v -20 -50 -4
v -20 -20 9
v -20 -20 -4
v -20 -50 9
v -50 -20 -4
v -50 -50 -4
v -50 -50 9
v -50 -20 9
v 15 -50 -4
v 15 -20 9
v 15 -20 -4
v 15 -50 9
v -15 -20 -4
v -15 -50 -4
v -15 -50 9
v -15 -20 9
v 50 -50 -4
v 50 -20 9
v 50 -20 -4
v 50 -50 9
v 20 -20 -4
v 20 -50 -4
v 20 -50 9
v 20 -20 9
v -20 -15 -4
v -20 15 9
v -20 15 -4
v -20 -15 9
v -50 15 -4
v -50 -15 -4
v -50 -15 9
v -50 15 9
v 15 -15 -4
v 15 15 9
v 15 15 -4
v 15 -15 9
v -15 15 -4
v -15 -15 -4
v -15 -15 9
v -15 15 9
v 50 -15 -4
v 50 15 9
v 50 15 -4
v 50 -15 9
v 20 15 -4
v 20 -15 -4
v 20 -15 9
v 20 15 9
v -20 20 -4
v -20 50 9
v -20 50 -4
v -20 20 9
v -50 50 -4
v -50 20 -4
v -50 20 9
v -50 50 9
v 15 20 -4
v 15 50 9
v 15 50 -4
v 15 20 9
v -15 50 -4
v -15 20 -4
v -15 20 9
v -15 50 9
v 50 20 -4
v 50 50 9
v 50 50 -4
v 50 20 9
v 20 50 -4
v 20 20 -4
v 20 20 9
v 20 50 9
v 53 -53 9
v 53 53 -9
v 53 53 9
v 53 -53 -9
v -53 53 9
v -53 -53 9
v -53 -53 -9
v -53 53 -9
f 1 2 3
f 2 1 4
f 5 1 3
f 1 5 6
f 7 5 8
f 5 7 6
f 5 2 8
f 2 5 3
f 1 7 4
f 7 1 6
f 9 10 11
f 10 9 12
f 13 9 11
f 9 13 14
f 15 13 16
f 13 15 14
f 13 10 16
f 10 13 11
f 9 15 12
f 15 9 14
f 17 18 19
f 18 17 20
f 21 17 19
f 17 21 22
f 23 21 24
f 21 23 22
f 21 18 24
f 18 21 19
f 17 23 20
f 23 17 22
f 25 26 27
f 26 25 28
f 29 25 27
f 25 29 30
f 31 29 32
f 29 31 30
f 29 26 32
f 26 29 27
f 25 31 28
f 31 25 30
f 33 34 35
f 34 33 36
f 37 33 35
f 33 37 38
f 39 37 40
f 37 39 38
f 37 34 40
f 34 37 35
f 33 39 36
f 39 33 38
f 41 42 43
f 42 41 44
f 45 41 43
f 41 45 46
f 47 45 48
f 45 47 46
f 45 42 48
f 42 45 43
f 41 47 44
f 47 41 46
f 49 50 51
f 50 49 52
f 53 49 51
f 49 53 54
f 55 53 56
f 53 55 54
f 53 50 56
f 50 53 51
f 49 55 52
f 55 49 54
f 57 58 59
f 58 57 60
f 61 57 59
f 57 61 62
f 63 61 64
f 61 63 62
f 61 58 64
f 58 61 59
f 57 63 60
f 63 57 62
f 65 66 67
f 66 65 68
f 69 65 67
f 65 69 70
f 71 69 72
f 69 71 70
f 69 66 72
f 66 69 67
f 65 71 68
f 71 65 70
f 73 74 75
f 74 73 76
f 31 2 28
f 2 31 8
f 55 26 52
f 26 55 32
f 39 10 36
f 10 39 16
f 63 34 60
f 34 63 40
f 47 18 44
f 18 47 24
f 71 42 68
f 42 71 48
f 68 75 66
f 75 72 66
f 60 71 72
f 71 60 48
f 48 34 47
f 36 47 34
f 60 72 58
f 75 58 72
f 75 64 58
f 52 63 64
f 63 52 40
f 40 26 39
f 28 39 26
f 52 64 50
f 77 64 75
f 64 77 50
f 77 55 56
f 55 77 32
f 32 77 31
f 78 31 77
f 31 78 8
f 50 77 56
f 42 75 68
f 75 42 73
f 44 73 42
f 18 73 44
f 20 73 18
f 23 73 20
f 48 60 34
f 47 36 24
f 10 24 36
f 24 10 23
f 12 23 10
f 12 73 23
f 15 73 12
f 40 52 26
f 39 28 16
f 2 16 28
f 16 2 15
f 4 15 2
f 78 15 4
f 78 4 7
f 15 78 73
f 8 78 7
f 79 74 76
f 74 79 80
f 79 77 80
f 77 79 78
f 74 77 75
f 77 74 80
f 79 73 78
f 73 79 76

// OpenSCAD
$fn = 32;

// ----------------------------------------------------------------------
// Pocket plate 106 x 106 x 18
// 3 x 3 pockets 30 mm square, 13 mm deep
// ----------------------------------------------------------------------

// --- parameters (mm) ---
thickness = 18;  // plate thickness
floor_t = 5;     // material left under each pocket
pocket = 30;     // pocket side length
pitch_x = 35;    // pocket pitch along X
pitch_y = 35;    // pocket pitch along Y
cols = 3;        // pockets per row
rows = 3;        // rows of pockets

// --- derived feature positions (mm) ---
depth = thickness - floor_t;        // = 13   pocket depth, down to the floor
span_x = (cols - 1) * pitch_x;      // = 70   distance between outer pockets
span_y = (rows - 1) * pitch_y;      // = 70   distance between outer pocket rows
origin_x = -span_x / 2;             // = -35   X of the first pocket
origin_y = -span_y / 2;             // = -35   Y of the first pocket
plate = [span_x + pocket + 6, span_y + pocket + 6, thickness];  // = [106, 106, 18]   overall size: pockets plus 3 mm of wall on each side
feature_centers = [
  [origin_x + 0 * pitch_x, origin_y + 0 * pitch_y],
  [origin_x + 1 * pitch_x, origin_y + 0 * pitch_y],
  [origin_x + 2 * pitch_x, origin_y + 0 * pitch_y],
  [origin_x + 0 * pitch_x, origin_y + 1 * pitch_y],
  [origin_x + 1 * pitch_x, origin_y + 1 * pitch_y],
  [origin_x + 2 * pitch_x, origin_y + 1 * pitch_y],
  [origin_x + 0 * pitch_x, origin_y + 2 * pitch_y],
  [origin_x + 1 * pitch_x, origin_y + 2 * pitch_y],
  [origin_x + 2 * pitch_x, origin_y + 2 * pitch_y]
];   // pocket centres, used verbatim by the cutter loop

// plate outline, then one pocket per centre in feature_centers
difference() {
  cube(plate, center = true);
  for (centre = feature_centers)
    translate([centre[0] - pocket / 2, centre[1] - pocket / 2, plate[2] / 2 - depth])
      cube([pocket, pocket, depth + 1]);  // centred on the declared pocket centre
}
